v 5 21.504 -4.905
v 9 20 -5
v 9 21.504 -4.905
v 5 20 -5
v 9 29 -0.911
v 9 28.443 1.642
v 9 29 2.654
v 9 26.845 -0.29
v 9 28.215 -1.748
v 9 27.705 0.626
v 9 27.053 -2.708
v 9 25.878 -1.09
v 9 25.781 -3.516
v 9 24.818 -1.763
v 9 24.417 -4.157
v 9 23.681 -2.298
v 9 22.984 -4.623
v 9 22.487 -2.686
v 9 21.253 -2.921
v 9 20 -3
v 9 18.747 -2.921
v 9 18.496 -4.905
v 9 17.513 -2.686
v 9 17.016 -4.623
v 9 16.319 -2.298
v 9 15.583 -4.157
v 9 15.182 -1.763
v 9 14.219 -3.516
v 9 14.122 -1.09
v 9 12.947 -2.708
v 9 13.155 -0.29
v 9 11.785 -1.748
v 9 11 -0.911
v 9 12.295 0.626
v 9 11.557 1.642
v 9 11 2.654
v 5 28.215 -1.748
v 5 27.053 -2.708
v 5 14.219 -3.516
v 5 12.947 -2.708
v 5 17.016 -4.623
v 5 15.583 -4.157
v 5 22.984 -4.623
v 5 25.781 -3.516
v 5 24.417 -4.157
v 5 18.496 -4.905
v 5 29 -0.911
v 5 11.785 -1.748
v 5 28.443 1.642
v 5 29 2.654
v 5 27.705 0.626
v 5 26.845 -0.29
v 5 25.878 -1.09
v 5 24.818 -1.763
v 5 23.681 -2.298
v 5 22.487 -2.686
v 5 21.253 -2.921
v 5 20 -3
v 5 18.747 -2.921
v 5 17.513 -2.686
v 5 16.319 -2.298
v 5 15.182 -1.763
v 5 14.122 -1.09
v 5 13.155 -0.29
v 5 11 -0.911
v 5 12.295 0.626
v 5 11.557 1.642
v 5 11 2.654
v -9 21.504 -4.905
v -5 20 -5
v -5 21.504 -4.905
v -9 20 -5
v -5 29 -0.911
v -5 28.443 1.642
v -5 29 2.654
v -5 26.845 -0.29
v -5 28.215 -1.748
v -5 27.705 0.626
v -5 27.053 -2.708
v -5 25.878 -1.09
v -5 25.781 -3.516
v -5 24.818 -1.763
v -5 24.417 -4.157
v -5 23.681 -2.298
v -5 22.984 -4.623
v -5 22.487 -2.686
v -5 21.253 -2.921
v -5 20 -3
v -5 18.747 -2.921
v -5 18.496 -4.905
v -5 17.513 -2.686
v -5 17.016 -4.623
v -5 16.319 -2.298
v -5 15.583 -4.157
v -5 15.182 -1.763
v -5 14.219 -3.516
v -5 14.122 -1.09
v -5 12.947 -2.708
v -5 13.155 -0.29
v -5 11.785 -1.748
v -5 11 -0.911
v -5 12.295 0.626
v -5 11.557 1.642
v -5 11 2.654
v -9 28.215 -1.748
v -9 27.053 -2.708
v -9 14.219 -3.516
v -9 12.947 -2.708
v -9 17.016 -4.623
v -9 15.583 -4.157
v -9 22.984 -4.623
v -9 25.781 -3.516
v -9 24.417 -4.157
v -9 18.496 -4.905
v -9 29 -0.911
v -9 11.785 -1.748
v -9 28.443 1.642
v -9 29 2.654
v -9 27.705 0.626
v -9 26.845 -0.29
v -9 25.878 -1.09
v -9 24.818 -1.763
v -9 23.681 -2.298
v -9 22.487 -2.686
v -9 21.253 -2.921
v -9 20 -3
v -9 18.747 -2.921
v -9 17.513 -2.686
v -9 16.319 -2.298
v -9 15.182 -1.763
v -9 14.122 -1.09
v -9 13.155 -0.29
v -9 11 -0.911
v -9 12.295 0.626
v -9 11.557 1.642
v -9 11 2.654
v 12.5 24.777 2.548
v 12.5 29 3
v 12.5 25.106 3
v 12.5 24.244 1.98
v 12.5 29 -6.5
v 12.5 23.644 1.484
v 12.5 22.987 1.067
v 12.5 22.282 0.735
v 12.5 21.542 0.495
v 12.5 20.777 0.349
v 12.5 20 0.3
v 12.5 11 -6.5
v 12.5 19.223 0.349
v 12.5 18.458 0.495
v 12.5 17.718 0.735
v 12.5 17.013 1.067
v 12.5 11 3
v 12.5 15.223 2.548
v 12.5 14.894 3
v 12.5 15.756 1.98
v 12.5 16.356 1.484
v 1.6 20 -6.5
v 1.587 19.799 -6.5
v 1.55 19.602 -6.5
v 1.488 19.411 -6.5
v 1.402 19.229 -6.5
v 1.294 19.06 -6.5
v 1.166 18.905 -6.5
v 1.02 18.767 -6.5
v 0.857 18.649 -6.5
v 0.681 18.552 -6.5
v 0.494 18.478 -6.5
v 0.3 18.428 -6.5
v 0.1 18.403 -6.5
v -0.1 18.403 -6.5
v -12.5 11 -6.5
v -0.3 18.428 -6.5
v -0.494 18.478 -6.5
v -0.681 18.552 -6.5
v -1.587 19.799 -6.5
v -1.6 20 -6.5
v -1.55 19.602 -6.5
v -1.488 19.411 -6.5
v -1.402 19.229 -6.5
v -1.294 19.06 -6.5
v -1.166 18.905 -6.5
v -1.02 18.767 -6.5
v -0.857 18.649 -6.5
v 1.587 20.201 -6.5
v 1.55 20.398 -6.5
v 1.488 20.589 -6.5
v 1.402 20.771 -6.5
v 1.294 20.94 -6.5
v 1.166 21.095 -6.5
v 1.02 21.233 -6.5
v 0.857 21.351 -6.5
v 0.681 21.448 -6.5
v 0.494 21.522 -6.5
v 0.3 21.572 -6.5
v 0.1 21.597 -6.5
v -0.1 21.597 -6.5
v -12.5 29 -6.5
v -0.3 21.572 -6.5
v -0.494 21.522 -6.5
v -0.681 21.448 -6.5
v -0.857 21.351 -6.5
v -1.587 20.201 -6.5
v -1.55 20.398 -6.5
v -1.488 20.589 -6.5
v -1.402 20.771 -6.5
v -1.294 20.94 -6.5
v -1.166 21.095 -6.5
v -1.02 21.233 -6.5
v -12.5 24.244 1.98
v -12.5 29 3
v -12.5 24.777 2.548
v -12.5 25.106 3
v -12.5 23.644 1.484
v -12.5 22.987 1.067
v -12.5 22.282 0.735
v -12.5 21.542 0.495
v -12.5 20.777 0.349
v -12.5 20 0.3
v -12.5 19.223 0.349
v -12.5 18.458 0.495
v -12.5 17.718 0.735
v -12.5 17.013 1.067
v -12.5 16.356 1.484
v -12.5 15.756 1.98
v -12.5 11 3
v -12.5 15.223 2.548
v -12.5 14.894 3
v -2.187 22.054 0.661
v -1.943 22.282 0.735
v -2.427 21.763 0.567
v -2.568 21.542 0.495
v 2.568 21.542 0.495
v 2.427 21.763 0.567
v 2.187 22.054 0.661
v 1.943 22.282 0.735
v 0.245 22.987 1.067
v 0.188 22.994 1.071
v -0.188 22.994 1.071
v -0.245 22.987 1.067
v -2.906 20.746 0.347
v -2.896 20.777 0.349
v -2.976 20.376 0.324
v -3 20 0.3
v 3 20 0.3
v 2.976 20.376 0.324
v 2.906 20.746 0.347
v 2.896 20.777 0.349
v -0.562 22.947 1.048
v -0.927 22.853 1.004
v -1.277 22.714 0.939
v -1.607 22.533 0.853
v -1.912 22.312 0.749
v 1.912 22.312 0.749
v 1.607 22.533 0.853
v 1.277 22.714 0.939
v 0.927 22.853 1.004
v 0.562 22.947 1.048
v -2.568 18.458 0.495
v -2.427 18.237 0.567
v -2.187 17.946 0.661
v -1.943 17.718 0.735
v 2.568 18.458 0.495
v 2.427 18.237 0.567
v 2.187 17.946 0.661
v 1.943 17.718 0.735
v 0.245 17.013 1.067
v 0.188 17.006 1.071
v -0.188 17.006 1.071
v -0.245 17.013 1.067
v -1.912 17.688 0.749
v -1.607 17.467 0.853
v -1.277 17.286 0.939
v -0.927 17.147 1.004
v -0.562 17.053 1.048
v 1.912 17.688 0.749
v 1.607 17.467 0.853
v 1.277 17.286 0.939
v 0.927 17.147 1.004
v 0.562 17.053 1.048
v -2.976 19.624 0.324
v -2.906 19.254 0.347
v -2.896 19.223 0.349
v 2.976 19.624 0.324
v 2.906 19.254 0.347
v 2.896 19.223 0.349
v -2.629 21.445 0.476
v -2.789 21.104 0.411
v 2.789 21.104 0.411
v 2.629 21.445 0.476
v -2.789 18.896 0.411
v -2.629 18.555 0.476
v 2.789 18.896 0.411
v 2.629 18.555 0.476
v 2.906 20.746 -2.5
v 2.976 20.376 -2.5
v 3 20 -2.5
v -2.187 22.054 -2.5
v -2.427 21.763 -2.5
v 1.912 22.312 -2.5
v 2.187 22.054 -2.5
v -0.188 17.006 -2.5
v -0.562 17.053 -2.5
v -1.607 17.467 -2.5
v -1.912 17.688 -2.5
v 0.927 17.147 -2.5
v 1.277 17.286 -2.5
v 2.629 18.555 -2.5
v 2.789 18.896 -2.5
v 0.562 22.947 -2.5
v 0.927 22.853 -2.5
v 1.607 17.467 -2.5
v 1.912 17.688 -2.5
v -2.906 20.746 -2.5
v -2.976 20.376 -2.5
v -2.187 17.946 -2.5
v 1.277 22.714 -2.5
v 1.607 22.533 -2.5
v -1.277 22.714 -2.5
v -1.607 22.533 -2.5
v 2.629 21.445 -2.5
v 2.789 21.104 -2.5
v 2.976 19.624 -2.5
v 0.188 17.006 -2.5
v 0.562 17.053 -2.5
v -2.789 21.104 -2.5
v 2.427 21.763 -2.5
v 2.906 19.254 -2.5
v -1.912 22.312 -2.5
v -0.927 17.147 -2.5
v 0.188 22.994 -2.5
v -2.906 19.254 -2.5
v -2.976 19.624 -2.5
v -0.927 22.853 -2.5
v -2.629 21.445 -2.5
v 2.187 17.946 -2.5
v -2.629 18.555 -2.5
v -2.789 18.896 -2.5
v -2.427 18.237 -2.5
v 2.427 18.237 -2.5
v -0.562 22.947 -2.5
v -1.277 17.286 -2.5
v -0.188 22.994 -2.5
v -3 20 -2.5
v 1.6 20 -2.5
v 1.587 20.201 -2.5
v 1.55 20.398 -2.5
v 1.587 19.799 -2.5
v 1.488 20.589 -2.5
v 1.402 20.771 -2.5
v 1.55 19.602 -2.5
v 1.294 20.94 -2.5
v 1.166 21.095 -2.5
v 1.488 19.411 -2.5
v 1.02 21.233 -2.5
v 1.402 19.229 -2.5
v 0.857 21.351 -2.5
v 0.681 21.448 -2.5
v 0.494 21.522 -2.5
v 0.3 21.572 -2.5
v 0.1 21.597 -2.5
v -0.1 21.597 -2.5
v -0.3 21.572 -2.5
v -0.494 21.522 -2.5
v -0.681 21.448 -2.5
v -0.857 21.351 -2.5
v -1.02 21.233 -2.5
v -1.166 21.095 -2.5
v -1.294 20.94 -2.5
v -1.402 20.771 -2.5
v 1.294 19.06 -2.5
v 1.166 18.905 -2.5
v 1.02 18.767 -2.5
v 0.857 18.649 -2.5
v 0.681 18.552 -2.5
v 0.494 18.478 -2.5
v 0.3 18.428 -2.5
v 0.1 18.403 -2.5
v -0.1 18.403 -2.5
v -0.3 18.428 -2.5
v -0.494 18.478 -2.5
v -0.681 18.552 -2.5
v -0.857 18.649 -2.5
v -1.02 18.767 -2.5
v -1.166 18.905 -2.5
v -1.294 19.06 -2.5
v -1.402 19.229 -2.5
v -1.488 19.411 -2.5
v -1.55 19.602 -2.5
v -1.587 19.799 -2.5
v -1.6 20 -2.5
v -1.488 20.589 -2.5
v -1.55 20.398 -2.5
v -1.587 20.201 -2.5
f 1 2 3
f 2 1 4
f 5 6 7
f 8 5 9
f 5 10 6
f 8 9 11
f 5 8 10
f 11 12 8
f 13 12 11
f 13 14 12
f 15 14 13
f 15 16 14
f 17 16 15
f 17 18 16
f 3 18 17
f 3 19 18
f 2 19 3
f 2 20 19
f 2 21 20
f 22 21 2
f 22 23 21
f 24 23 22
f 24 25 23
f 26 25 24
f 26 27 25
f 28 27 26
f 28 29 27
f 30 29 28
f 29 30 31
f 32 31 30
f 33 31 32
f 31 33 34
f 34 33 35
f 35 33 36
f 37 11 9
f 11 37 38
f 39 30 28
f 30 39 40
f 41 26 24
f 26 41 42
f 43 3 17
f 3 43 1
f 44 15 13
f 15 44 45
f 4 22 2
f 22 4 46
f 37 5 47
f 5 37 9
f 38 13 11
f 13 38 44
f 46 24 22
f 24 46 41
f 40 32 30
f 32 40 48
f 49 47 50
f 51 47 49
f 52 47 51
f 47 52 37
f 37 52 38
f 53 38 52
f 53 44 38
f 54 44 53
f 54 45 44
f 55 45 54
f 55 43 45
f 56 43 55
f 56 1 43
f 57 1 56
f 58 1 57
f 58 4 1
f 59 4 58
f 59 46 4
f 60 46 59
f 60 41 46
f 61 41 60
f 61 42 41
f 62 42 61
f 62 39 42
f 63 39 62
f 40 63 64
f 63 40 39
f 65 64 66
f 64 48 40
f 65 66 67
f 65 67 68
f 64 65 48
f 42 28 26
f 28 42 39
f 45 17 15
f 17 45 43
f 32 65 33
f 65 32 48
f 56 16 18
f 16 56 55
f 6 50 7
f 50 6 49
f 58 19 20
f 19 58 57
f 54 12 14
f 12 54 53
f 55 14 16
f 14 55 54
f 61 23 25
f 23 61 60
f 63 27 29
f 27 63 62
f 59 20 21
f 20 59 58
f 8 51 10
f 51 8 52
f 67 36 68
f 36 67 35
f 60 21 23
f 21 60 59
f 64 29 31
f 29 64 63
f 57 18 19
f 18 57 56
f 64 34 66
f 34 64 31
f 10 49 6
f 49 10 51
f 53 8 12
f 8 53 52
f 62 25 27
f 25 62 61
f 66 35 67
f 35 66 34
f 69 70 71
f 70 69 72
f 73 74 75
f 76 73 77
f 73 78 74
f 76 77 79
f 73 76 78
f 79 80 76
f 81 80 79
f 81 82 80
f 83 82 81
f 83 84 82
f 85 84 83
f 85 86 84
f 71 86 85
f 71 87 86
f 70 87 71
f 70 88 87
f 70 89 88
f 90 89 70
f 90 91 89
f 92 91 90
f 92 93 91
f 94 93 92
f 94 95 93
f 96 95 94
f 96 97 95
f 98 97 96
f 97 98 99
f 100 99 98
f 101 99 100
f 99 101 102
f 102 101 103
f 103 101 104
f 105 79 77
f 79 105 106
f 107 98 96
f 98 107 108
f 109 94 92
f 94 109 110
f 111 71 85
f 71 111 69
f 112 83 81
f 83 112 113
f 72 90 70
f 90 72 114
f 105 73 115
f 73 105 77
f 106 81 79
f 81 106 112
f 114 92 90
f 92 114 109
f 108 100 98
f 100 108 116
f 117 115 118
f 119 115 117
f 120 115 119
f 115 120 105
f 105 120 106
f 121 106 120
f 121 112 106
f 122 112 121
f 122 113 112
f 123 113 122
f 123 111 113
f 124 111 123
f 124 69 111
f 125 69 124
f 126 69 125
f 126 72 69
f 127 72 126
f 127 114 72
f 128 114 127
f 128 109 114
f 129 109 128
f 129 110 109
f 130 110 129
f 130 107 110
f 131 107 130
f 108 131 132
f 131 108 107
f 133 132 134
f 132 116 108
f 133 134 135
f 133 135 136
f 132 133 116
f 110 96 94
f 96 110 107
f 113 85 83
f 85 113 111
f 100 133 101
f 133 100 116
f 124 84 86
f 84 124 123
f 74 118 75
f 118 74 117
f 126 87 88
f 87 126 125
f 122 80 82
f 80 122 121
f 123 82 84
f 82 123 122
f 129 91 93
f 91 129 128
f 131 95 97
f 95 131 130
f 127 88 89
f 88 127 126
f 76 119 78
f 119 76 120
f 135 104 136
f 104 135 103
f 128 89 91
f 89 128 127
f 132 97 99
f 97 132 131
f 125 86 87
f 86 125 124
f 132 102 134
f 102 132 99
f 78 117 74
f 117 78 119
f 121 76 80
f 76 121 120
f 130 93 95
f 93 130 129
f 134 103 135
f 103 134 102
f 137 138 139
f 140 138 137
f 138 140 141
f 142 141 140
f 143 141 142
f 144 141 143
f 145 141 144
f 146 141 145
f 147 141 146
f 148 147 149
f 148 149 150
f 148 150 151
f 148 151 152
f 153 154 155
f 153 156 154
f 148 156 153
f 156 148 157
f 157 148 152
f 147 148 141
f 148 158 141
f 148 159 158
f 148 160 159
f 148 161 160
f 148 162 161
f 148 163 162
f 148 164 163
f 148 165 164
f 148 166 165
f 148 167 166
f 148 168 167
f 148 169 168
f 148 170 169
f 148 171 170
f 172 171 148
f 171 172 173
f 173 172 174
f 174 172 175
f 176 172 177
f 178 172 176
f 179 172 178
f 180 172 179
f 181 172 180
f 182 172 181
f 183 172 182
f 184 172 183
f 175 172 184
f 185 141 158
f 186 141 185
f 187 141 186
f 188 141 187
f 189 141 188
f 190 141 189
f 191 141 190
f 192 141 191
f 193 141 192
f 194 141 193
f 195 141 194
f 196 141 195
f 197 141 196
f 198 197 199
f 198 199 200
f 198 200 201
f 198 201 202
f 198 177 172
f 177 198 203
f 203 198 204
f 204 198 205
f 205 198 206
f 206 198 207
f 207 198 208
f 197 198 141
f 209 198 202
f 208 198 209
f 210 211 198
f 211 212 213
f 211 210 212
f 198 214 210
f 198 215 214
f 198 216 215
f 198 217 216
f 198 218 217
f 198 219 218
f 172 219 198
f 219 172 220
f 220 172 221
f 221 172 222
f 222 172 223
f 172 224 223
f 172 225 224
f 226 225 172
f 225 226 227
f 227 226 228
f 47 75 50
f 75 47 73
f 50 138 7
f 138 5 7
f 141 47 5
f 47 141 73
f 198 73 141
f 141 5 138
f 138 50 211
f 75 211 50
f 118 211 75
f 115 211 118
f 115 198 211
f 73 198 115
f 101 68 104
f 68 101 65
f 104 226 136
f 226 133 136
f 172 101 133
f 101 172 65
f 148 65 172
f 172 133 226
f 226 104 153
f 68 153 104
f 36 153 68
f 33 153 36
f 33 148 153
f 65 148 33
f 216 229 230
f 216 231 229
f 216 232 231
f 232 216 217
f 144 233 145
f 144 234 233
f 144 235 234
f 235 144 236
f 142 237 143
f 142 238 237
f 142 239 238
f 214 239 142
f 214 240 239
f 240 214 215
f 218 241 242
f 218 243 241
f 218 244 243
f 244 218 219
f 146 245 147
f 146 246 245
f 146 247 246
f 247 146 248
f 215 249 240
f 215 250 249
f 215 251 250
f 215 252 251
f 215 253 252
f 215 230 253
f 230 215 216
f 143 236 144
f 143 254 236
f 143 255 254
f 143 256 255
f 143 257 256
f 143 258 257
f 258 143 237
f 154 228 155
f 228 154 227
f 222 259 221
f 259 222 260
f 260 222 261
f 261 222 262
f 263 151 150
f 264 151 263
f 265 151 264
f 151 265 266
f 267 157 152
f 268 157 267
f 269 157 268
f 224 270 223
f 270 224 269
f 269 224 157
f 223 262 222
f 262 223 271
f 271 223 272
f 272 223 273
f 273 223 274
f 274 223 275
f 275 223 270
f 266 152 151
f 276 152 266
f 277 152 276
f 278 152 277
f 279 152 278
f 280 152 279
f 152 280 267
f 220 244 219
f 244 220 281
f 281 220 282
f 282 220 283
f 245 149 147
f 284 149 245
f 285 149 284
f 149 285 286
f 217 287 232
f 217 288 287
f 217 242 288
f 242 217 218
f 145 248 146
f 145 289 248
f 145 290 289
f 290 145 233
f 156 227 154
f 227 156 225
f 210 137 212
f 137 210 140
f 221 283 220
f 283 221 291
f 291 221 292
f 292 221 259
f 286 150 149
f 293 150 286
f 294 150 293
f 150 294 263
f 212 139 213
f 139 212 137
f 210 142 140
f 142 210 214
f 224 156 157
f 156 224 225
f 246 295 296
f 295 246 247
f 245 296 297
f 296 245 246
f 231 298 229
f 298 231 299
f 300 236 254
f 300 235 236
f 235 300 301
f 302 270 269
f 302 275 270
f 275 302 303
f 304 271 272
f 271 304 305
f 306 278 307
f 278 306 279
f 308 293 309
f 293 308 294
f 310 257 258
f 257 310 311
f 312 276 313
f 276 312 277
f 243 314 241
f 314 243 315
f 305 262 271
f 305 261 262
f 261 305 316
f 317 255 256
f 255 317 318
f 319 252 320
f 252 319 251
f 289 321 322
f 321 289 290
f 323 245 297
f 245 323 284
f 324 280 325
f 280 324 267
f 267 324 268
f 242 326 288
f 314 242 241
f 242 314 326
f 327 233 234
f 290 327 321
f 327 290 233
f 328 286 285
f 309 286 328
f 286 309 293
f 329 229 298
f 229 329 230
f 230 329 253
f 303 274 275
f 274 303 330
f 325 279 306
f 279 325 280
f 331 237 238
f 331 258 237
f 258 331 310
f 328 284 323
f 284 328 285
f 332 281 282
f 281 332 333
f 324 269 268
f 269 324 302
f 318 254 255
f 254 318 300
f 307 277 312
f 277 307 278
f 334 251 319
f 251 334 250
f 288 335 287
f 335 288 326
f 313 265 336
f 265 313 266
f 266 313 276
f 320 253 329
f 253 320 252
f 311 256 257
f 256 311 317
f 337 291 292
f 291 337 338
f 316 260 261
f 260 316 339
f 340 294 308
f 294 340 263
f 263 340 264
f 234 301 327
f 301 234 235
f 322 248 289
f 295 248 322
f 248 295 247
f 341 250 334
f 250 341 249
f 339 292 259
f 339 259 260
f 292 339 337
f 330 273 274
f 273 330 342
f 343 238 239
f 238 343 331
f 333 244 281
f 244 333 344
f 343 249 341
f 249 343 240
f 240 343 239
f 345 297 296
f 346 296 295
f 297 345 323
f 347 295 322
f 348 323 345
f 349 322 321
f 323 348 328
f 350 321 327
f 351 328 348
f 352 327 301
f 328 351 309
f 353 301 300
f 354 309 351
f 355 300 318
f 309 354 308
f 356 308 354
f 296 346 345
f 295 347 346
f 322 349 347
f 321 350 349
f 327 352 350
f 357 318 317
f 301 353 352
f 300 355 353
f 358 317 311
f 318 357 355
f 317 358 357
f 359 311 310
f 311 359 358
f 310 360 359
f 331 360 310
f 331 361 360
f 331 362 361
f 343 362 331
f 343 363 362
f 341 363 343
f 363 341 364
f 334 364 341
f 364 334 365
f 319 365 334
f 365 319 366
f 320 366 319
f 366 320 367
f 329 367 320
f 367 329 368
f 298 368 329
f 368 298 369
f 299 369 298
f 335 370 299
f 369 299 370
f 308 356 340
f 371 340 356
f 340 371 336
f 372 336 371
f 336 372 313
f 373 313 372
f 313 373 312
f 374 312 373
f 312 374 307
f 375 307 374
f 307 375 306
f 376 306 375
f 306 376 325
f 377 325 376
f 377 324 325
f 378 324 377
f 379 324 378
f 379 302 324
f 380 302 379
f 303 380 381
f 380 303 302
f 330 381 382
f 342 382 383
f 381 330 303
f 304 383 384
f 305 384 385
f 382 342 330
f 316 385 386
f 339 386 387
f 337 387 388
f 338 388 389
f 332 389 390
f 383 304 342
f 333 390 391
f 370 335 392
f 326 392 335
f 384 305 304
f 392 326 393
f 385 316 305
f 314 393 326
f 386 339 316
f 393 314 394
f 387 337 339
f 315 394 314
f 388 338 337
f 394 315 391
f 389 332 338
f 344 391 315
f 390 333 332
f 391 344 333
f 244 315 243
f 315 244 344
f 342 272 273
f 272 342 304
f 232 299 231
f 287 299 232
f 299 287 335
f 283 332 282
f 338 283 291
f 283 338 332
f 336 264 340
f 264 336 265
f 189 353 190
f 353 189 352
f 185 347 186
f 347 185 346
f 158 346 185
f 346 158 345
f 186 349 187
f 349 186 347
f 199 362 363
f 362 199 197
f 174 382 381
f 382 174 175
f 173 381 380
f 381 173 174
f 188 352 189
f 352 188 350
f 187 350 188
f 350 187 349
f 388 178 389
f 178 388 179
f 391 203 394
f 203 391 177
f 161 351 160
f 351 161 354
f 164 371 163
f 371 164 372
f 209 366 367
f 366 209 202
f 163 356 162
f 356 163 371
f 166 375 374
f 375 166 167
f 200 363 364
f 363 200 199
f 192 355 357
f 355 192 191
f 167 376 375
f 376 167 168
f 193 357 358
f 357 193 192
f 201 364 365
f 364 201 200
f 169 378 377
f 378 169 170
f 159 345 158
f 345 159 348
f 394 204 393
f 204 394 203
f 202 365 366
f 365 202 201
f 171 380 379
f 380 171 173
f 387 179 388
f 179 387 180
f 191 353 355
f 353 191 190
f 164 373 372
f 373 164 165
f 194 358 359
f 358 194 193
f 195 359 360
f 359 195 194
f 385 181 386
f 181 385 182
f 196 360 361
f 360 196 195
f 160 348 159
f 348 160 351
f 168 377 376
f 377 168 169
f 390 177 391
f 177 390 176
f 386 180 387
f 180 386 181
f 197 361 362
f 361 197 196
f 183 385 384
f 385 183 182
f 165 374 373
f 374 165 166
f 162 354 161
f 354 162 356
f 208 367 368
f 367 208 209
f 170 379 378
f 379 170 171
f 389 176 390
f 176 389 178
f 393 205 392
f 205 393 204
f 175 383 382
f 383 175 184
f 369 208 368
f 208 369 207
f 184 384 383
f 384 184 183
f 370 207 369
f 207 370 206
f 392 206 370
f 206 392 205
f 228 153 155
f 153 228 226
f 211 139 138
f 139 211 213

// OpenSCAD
$fn = 50;
screw_distance_x = 60;
screw_distance_y = 40;
wall_thickness = 2.5;

case_width = screw_distance_x*2;
case_length = screw_distance_y*2.25+15;
case_height = 32;



bearing_diameter = 16;
bearing_length = 28;

//rotate([0,180,0]) exposer_case_bottom();
//rotate([0,180,0]) translate([0,0,-18])
//  exposer_case_top();
//translate([-12,-45,-case_height+23]) rotate([0,0,60])laser_mount();

translate([0,20,0]) laser_mount();
//laser_mount_light();

module laser_mount(){
  difference(){ 
   cube([25,18,13],true);
   //translate([0,0,7.5]) cylinder(28,10,10,true);
   translate([0,0,6.5]) rotate([0,90,0]) cylinder(26,6.2,6.2,true);
   cylinder(5,3,3,true);
   cylinder(13.2,1.6,1.6,true);
   translate([0,0,11]) cube([30,20,16],true);
   translate([0,0,16]) rotate([0,90,90]) cylinder(30,1.6,1.6,true);
   translate([0,9,16]) rotate([0,90,90])  cylinder(2,3,3,true,$fn=6);

   translate([7,0,7]) difference(){
    rotate([0,90,0]) cylinder(4,12,12,true);
    rotate([0,90,0]) cylinder(4.1,10,10,true);
   }

   translate([-7,0,7]) difference(){
    rotate([0,90,0]) cylinder(4,12,12,true);
    rotate([0,90,0]) cylinder(4.1,10,10,true);
   }
   	
  }
}

module laser_mount_light(){
	translate([0,0,-5]){
	    cube([25,16,3],true);
	    translate([25/2,0,3.2]) cube([3,16,10],true);
     	translate([-25/2,0,3]) cube([3,16,10],true);
    }
	
	translate([0,0,6.5]) rotate([0,90,0]) cylinder(30,6.2,6.2,true);

}

/*
mirror([1,0,0]) translate([10,0,0])
	rotate([0,90,0]) 
   mirror_mount();
*/

/*
mirror([0,0,0]) translate([10,0,0])
	rotate([0,90,0]) 
   mirror_mount_with_sensor();
*/

module mirror_mount_with_sensor(){


   difference(){ 
    union(){
      translate([0,-1,0]) cube([5,23,18],true);
       // translate([-1,-8,0]) cube([3,14,16],true);
       //rotate([0,90,0]) cylinder(5,8,8,true);

    }
    	color([0,0,255]) translate([-7,1,-5]) rotate([45,0,0]) cube([case_width,5.3,8.5]);
    translate([0,6.9,-5]) rotate([0,90,0]) cylinder(9,1.6,1.6,true);
    translate([0,-8,-3]){
       //translate([-5,0,-6.1]) rotate([0,90,0]) cylinder(10,1.6,1.6);
       translate([-5,0,6.1]) rotate([0,90,0]) cylinder(10,1.6,1.6);
    }
    translate([-3,-12.5,-6]) cube([6.8,6.5,6.5]);
     translate([-2.6,-12.5,-9]) cube([2,7.5,18.5]);
  }
    translate([-8,5.5,0]) cube([10,3.3,8]);

}

module mirror_mount(){


   difference(){ 
    union(){
      translate([0,5,0]) cube([4,12,18],true);
       rotate([0,90,0]) cylinder(4,9,9,true);
    }
    	color([0,0,255]) translate([-7,1,-5]) rotate([45,0,0]) cube([case_width,5.3,8.5]);
    translate([0,6.9,-5]) rotate([0,90,0]) cylinder(9,1.6,1.6,true);
  }
    translate([-6,5.5,0]) cube([5,3.3,8]);


}

module base_form(width,length,height){
    
   translate([-length/2,-width/2,0]) minkowski(){
	cube([length,width,height],true);
    translate([length/2,width/2,0]) cylinder(1,5,5,true);
   }
   
}


module exposer_case_top(){
difference(){
 union(){
    // Base Form of Bottom Case
   	base_form(case_width,case_length,wall_thickness);

  difference(){
	translate([0,0,case_height/5-wall_thickness]) 
       base_form(case_width-wall_thickness*2,case_length-wall_thickness*2,case_height/5);
	
    translate([0,0,case_height/5+0.1-wall_thickness]) 
       base_form(case_width-wall_thickness*4,case_length-wall_thickness*4,case_height/5);
  }

  } 
 	// Mirror mount slor
	translate([(case_length/2)-13,0,-wall_thickness]) cube([3,case_width,case_height],true);
    translate([(case_length/2)-25,0,case_height/3-wall_thickness-0.65]) 
        cube([50,case_width+60,case_height/3+1],true);
}

   translate([52,-40,-1]) rotate([0,0,90]) wall_stabilizer();
	translate([52,0,-1]) rotate([0,0,90]) wall_stabilizer();
	translate([52,40,-1]) rotate([0,0,90]) wall_stabilizer();
}

module wall_stabilizer(){
	hull(){
	  translate([0,0,5])cube([2,2,case_height/5],true);
	  translate([0,3,2])cube([2,3,1],true);
    }
}





module exposer_case_bottom(){
  difference(){
    
    // Base Form of Bottom Case
   	base_form(case_width,case_length,case_height);
   	translate([0,0,-wall_thickness]) 
	  base_form(case_width-wall_thickness*2,case_length-wall_thickness*2,case_height);
	
     translate([10,-case_width/2-3,0]){ 
		 rotate([0,90,90]) cylinder(5,28/2,28/2,true);
	    translate([11.8,0,11.8]) rotate([0,90,90]) cylinder(5,3/2,3/2,true);
	    translate([11.8,0,-11.8]) rotate([0,90,90]) cylinder(5,3/2,3/2,true);
		translate([-11.8,0,11.8]) rotate([0,90,90]) cylinder(5,3/2,3/2,true);
   		translate([-11.8,0,-11.8]) rotate([0,90,90]) cylinder(5,3/2,3/2,true);
    }
    // Polygon Mirror Holes
	translate([-20,0,case_height/2-wall_thickness/2])
      rotate([0,0,90])  polygon_mirror_screw_holes();

	// Polygon Mirror Bottom Hole
	translate([-30,0,case_height/2]) 
      rotate([0,0,90]) cube([screw_distance_y/1.2,screw_distance_x/1.6,wall_thickness+2],true);

     // Front Bearing mount
     translate([case_length/2-bearing_length/2,screw_distance_x/2+16,case_height/2-wall_thickness/2]) 
       rotate([0,0,90]) bearing_hole();
     translate([case_length/2-bearing_length/2,-screw_distance_x+14,case_height/2-wall_thickness/2]) 
    	   rotate([0,0,90]) bearing_hole();

     // Back Bearing mount
     translate([-case_length/2+bearing_length/2,-screw_distance_x+14,case_height/2-wall_thickness/2]) 
		rotate([0,0,90]) bearing_hole();
     translate([-case_length/2+bearing_length/2,screw_distance_x/2+16,case_height/2-wall_thickness/2]) 
       rotate([0,0,90]) bearing_hole();

	// Mirror mount slor
	translate([(case_length/2)-5,0,-wall_thickness]) cube([4,case_width*2,case_height],true);
	
	// laser mount hole
    translate([screw_distance_y/4+2,-screw_distance_x/2-16,case_height/2-wall_thickness/2]) 
      cylinder(wall_thickness+2,1.6,1.6,true);
	/*
	#translate([screw_distance_y/4,-10,case_height/2]){
	  cylinder(wall_thickness*3,1.6,1.6,true);
      translate([20,0,0])cylinder(wall_thickness*3,1.6,1.6,true);
    }
	*/

  }
}

module polygon_mirror_screw_holes(){
  translate([-screw_distance_y/2,screw_distance_x/2,0]) cylinder(wall_thickness+4,1.6,1.6,true);  
  translate([-screw_distance_y/2,-screw_distance_x/2,0]) cylinder(wall_thickness+4,1.6,1.6,true);
  translate([screw_distance_y/2,screw_distance_x/2,0]) cylinder(wall_thickness+4,1.6,1.6,true);
  translate([screw_distance_y/2,-screw_distance_x/2,0]) cylinder(wall_thickness+4,1.6,1.6,true);
}

module bearing_hole(){

    hull(){
   	   translate([0,-bearing_length/2+bearing_diameter/4,0]) 
        cylinder(wall_thickness+2,bearing_diameter/4,bearing_diameter/4,true);
    	 translate([0,bearing_length/2-bearing_diameter/4,0]) 
        cylinder(wall_thickness+2,bearing_diameter/4,bearing_diameter/4,true);
    }
    translate([8,bearing_length/3,0]) cylinder(wall_thickness+3,1.6,1.6,true);
    translate([-8,-bearing_length/3,0]) cylinder(wall_thickness+3,1.6,1.6,true);
    translate([8,-bearing_length/3,0]) cylinder(wall_thickness+3,1.6,1.6,true);
    translate([-8,bearing_length/3,0]) cylinder(wall_thickness+3,1.6,1.6,true);
 
}
